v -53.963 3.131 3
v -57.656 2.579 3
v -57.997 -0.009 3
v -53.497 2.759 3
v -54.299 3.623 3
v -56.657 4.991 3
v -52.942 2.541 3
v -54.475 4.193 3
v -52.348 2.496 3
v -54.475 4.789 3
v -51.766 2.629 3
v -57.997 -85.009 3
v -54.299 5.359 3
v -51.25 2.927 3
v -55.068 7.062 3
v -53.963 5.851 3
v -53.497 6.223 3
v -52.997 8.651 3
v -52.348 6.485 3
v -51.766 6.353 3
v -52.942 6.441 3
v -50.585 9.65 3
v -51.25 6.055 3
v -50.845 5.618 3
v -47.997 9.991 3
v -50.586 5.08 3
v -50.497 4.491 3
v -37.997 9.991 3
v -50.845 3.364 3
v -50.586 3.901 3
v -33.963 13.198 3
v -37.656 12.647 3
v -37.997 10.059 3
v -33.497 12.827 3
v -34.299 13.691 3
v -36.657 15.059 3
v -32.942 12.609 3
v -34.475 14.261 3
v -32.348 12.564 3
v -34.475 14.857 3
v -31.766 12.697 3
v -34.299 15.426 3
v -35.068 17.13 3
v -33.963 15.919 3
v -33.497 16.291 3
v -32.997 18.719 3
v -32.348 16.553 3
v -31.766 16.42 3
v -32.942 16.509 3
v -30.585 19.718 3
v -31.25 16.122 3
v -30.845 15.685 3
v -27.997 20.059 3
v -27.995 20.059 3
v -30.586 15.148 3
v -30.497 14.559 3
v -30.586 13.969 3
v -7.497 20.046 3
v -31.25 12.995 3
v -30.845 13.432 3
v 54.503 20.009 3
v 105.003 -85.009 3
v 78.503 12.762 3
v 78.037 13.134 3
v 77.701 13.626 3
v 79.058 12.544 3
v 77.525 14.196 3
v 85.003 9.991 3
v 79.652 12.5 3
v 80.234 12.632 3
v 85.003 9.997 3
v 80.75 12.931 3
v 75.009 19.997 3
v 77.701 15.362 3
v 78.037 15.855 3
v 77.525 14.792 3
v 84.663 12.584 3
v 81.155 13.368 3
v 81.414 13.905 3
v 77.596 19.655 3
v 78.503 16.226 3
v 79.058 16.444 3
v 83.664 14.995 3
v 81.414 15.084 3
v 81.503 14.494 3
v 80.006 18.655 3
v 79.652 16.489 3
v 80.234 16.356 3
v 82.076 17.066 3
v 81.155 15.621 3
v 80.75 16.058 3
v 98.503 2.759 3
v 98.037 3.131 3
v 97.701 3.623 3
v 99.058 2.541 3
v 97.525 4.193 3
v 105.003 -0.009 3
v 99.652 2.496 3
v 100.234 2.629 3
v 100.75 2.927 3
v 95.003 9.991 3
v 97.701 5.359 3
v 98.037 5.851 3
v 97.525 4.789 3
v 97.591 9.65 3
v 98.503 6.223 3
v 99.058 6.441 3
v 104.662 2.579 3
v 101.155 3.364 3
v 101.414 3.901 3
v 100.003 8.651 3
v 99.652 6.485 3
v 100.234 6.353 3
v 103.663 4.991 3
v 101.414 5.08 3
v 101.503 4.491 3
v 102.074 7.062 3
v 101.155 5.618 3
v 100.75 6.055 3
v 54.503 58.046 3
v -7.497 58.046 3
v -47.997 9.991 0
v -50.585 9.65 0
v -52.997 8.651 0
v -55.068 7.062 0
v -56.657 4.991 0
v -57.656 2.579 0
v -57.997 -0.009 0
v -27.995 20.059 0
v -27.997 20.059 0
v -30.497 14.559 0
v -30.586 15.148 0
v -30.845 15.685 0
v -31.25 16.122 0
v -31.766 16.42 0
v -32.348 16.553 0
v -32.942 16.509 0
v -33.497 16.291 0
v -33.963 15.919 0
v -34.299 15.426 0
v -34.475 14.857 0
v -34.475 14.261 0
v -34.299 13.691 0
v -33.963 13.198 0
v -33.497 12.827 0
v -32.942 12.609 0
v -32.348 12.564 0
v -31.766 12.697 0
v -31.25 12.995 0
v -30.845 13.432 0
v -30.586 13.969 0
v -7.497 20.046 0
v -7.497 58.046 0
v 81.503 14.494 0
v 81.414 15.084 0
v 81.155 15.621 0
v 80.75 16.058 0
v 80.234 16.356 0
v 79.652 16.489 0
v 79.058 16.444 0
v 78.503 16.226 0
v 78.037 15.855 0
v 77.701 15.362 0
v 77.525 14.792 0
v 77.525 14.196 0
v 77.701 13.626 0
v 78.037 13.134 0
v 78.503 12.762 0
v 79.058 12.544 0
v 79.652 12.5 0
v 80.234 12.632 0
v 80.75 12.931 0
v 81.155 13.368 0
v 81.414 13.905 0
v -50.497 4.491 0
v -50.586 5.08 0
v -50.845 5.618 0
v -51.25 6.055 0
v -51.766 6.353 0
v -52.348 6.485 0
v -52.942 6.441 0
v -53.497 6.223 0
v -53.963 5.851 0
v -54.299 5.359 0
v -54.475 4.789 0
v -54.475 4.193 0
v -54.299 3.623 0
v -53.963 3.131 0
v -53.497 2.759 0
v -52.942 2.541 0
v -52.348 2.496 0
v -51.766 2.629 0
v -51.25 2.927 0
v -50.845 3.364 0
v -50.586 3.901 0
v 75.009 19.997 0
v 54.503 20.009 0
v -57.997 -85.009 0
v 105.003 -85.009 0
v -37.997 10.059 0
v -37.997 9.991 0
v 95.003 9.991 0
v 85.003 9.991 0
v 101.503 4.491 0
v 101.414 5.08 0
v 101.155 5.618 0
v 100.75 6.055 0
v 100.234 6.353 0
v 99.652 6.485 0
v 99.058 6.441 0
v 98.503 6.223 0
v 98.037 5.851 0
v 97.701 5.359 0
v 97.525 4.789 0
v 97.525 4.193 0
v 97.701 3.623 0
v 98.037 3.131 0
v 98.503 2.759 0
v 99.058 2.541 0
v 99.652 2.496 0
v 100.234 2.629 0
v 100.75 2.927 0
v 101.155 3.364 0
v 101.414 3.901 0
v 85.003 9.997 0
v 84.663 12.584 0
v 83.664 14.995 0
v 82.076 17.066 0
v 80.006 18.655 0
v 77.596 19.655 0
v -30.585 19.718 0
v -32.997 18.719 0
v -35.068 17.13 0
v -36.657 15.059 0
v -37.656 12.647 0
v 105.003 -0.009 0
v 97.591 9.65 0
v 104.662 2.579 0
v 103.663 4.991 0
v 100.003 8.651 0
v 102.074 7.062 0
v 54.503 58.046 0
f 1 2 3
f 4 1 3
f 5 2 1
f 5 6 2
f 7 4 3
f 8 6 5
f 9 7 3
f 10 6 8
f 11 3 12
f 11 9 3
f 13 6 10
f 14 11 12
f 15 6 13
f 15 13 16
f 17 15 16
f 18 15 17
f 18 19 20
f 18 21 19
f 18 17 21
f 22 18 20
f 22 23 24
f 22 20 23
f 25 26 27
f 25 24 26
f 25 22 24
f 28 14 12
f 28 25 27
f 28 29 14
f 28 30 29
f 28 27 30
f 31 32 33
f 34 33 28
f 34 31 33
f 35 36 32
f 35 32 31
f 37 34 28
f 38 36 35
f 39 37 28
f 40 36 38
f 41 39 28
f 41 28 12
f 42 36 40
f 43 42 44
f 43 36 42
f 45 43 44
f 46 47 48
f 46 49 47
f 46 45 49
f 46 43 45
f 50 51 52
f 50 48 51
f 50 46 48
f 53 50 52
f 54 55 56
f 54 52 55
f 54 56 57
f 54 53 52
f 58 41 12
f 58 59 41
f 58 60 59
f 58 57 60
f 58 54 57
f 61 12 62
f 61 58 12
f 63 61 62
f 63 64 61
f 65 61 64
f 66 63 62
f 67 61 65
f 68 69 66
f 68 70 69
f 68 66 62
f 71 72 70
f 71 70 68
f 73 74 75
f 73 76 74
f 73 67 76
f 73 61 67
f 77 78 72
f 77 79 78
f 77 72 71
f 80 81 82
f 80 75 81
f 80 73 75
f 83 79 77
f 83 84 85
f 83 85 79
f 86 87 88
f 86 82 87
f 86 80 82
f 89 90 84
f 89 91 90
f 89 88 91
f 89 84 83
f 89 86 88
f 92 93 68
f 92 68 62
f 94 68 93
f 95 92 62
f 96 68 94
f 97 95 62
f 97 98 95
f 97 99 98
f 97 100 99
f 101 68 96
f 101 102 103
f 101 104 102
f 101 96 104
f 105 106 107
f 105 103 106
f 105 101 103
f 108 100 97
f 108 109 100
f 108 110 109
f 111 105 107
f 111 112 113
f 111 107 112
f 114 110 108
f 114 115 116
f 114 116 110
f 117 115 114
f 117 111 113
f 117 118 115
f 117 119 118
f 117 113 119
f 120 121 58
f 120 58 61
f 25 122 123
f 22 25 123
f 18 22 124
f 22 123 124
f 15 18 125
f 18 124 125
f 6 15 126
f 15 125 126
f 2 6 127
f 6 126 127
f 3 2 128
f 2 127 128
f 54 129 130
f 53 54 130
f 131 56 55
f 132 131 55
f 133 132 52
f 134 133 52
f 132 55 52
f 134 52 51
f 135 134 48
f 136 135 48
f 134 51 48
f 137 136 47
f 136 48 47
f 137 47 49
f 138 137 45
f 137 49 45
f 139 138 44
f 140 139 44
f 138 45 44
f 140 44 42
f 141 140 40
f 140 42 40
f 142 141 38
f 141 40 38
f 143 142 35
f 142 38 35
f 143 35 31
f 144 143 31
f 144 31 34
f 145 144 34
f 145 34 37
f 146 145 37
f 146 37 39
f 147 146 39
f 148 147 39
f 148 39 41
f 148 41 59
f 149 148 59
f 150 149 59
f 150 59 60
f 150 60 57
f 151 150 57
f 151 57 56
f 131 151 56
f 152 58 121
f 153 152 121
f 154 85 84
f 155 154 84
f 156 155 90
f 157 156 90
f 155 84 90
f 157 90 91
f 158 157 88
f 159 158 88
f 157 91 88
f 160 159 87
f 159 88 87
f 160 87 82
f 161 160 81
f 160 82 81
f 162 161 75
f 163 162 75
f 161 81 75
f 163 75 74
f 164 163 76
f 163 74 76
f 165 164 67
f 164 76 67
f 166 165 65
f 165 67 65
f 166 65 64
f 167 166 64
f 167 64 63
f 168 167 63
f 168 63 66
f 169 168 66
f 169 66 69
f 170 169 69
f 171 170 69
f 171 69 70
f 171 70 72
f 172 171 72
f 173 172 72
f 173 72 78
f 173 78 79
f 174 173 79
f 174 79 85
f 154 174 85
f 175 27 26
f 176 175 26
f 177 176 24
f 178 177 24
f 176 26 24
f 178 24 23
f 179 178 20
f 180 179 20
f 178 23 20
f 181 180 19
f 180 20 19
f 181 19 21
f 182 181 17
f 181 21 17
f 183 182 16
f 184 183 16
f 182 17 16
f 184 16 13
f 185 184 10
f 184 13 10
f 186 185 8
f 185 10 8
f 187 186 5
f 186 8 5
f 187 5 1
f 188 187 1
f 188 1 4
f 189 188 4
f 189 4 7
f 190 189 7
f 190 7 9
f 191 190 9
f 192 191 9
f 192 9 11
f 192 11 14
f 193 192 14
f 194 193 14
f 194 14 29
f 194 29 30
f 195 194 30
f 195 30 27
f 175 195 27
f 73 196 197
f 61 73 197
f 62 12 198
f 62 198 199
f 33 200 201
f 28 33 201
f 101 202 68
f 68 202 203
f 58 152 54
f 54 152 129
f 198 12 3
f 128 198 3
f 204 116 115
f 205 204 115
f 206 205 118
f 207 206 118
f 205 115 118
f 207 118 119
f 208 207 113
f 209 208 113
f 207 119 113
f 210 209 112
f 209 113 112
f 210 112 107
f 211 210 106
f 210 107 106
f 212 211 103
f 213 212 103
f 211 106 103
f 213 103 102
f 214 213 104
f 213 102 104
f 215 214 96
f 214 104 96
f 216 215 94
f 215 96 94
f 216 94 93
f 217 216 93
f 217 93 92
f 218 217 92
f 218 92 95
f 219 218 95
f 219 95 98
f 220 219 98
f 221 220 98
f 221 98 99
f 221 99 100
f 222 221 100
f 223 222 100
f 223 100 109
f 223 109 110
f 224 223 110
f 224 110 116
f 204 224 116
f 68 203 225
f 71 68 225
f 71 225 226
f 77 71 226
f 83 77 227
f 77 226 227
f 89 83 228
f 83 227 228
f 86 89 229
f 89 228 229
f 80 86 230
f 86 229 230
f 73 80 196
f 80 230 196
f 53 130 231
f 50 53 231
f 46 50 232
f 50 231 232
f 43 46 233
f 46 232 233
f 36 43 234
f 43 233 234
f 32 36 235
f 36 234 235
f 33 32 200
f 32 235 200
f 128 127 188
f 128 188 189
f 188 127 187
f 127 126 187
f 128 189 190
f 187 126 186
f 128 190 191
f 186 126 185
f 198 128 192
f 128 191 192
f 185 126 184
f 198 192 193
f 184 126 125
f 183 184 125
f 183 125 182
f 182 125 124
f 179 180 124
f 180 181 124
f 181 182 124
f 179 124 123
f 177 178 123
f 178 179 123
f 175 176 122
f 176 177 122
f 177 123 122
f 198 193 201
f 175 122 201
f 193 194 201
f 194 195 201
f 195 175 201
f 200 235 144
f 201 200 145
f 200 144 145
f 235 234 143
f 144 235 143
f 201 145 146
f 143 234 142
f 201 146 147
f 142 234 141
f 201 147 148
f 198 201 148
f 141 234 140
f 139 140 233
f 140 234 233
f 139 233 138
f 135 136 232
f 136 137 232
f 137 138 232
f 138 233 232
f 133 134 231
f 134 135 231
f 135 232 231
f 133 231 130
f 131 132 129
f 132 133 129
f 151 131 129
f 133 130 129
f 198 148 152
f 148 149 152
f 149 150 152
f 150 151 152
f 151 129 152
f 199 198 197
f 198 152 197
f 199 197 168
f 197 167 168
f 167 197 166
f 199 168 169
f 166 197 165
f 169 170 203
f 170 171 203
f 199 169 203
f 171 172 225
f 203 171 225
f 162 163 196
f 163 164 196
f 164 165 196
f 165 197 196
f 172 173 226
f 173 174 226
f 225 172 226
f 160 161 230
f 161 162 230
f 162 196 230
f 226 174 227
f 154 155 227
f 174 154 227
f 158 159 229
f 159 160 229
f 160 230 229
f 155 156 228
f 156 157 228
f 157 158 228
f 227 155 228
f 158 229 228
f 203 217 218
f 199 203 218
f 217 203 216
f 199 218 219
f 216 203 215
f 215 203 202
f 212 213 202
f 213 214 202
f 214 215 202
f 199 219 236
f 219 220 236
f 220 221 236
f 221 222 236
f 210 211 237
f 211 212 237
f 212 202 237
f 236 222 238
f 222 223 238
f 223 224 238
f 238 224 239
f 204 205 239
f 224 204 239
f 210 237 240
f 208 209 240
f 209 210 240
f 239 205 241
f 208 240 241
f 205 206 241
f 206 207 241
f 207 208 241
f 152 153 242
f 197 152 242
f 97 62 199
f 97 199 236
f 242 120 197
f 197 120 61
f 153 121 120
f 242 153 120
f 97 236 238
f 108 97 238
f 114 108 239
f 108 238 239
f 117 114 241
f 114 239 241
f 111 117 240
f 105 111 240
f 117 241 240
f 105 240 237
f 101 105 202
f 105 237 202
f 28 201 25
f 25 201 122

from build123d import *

# Parameters (mm, degrees)
BOSS_EXTRU_1_DEPTH      = 3
ESQUISSE4_R             = 2
ENL_V_MAT_EXTRU_1_DEPTH = 10
BOSS_EXTRU_2_DEPTH      = 3
ESQUISSE6_W             = 163
ESQUISSE6_H             = 80
BOSS_EXTRU_3_DEPTH      = 3


with BuildPart() as part:
    # Esquisse2 → Boss.-Extru.1 (new body)
    with BuildSketch(Plane.XY):
        with BuildLine():
            Line((-57.997011135, -5.009122385), (105.002988865, -5.009122385))
            Line((105.002988865, -5.009122385), (105.002988865, -0.009122385))
            ThreePointArc((105.002988865, -0.009122385), (102.074056676, 7.061945427), (95.002988865, 9.990877615))
            Line((95.002988865, 9.990877615), (85.002988865, 9.990877615))
            Line((85.002988865, 9.990877615), (85.002988865, 9.996878601))
            ThreePointArc((85.002988865, 9.996878601), (82.076178664, 17.065823789), (75.008991651, 19.9968768))
            Line((75.008991651, 19.9968768), (-27.995184752, 20.058708021))
            Line((-27.995184752, 20.058708021), (-27.997011135, 20.058708021))
            ThreePointArc((-27.997011135, 20.058708021), (-35.068078947, 17.129775833), (-37.997011135, 10.058708021))
            Line((-37.997011135, 10.058708021), (-37.997011135, 9.990877615))
            Line((-37.997011135, 9.990877615), (-47.997011135, 9.990877615))
            ThreePointArc((-47.997011135, 9.990877615), (-55.068078947, 7.061945427), (-57.997011135, -0.009122385))
            Line((-57.997011135, -0.009122385), (-57.997011135, -5.009122385))
        make_face()
    extrude(amount=BOSS_EXTRU_1_DEPTH)

    # Esquisse4 → Enlèv. mat.-Extru.1 (cut)
    with BuildSketch(Plane.XY.offset(3)):
        with Locations((-32.497011135, 14.558708021)):
            Circle(ESQUISSE4_R)
        with Locations((79.502988865, 14.494178158)):
            Circle(ESQUISSE4_R)
        with Locations((99.502988865, 4.490877615)):
            Circle(ESQUISSE4_R)
        with Locations((-52.497011135, 4.490877615)):
            Circle(ESQUISSE4_R)
    extrude(amount=-ENL_V_MAT_EXTRU_1_DEPTH, mode=Mode.SUBTRACT)

    # Esquisse5 → Boss.-Extru.2 (add)
    with BuildSketch(Plane.XY.offset(3)):
        Polygon((-7.497011135, 20.046403402), (-7.497011135, 58.046403402), (54.502988865, 58.046403402), (54.502988865, 20.009186118), align=None)
    extrude(amount=-BOSS_EXTRU_2_DEPTH)

    # Esquisse6 → Boss.-Extru.3 (add)
    with BuildSketch(Plane.XY.offset(3)):
        with Locations((23.502988865, -45.009122385)):
            Rectangle(ESQUISSE6_W, ESQUISSE6_H)
    extrude(amount=-BOSS_EXTRU_3_DEPTH)


solid = part.part
